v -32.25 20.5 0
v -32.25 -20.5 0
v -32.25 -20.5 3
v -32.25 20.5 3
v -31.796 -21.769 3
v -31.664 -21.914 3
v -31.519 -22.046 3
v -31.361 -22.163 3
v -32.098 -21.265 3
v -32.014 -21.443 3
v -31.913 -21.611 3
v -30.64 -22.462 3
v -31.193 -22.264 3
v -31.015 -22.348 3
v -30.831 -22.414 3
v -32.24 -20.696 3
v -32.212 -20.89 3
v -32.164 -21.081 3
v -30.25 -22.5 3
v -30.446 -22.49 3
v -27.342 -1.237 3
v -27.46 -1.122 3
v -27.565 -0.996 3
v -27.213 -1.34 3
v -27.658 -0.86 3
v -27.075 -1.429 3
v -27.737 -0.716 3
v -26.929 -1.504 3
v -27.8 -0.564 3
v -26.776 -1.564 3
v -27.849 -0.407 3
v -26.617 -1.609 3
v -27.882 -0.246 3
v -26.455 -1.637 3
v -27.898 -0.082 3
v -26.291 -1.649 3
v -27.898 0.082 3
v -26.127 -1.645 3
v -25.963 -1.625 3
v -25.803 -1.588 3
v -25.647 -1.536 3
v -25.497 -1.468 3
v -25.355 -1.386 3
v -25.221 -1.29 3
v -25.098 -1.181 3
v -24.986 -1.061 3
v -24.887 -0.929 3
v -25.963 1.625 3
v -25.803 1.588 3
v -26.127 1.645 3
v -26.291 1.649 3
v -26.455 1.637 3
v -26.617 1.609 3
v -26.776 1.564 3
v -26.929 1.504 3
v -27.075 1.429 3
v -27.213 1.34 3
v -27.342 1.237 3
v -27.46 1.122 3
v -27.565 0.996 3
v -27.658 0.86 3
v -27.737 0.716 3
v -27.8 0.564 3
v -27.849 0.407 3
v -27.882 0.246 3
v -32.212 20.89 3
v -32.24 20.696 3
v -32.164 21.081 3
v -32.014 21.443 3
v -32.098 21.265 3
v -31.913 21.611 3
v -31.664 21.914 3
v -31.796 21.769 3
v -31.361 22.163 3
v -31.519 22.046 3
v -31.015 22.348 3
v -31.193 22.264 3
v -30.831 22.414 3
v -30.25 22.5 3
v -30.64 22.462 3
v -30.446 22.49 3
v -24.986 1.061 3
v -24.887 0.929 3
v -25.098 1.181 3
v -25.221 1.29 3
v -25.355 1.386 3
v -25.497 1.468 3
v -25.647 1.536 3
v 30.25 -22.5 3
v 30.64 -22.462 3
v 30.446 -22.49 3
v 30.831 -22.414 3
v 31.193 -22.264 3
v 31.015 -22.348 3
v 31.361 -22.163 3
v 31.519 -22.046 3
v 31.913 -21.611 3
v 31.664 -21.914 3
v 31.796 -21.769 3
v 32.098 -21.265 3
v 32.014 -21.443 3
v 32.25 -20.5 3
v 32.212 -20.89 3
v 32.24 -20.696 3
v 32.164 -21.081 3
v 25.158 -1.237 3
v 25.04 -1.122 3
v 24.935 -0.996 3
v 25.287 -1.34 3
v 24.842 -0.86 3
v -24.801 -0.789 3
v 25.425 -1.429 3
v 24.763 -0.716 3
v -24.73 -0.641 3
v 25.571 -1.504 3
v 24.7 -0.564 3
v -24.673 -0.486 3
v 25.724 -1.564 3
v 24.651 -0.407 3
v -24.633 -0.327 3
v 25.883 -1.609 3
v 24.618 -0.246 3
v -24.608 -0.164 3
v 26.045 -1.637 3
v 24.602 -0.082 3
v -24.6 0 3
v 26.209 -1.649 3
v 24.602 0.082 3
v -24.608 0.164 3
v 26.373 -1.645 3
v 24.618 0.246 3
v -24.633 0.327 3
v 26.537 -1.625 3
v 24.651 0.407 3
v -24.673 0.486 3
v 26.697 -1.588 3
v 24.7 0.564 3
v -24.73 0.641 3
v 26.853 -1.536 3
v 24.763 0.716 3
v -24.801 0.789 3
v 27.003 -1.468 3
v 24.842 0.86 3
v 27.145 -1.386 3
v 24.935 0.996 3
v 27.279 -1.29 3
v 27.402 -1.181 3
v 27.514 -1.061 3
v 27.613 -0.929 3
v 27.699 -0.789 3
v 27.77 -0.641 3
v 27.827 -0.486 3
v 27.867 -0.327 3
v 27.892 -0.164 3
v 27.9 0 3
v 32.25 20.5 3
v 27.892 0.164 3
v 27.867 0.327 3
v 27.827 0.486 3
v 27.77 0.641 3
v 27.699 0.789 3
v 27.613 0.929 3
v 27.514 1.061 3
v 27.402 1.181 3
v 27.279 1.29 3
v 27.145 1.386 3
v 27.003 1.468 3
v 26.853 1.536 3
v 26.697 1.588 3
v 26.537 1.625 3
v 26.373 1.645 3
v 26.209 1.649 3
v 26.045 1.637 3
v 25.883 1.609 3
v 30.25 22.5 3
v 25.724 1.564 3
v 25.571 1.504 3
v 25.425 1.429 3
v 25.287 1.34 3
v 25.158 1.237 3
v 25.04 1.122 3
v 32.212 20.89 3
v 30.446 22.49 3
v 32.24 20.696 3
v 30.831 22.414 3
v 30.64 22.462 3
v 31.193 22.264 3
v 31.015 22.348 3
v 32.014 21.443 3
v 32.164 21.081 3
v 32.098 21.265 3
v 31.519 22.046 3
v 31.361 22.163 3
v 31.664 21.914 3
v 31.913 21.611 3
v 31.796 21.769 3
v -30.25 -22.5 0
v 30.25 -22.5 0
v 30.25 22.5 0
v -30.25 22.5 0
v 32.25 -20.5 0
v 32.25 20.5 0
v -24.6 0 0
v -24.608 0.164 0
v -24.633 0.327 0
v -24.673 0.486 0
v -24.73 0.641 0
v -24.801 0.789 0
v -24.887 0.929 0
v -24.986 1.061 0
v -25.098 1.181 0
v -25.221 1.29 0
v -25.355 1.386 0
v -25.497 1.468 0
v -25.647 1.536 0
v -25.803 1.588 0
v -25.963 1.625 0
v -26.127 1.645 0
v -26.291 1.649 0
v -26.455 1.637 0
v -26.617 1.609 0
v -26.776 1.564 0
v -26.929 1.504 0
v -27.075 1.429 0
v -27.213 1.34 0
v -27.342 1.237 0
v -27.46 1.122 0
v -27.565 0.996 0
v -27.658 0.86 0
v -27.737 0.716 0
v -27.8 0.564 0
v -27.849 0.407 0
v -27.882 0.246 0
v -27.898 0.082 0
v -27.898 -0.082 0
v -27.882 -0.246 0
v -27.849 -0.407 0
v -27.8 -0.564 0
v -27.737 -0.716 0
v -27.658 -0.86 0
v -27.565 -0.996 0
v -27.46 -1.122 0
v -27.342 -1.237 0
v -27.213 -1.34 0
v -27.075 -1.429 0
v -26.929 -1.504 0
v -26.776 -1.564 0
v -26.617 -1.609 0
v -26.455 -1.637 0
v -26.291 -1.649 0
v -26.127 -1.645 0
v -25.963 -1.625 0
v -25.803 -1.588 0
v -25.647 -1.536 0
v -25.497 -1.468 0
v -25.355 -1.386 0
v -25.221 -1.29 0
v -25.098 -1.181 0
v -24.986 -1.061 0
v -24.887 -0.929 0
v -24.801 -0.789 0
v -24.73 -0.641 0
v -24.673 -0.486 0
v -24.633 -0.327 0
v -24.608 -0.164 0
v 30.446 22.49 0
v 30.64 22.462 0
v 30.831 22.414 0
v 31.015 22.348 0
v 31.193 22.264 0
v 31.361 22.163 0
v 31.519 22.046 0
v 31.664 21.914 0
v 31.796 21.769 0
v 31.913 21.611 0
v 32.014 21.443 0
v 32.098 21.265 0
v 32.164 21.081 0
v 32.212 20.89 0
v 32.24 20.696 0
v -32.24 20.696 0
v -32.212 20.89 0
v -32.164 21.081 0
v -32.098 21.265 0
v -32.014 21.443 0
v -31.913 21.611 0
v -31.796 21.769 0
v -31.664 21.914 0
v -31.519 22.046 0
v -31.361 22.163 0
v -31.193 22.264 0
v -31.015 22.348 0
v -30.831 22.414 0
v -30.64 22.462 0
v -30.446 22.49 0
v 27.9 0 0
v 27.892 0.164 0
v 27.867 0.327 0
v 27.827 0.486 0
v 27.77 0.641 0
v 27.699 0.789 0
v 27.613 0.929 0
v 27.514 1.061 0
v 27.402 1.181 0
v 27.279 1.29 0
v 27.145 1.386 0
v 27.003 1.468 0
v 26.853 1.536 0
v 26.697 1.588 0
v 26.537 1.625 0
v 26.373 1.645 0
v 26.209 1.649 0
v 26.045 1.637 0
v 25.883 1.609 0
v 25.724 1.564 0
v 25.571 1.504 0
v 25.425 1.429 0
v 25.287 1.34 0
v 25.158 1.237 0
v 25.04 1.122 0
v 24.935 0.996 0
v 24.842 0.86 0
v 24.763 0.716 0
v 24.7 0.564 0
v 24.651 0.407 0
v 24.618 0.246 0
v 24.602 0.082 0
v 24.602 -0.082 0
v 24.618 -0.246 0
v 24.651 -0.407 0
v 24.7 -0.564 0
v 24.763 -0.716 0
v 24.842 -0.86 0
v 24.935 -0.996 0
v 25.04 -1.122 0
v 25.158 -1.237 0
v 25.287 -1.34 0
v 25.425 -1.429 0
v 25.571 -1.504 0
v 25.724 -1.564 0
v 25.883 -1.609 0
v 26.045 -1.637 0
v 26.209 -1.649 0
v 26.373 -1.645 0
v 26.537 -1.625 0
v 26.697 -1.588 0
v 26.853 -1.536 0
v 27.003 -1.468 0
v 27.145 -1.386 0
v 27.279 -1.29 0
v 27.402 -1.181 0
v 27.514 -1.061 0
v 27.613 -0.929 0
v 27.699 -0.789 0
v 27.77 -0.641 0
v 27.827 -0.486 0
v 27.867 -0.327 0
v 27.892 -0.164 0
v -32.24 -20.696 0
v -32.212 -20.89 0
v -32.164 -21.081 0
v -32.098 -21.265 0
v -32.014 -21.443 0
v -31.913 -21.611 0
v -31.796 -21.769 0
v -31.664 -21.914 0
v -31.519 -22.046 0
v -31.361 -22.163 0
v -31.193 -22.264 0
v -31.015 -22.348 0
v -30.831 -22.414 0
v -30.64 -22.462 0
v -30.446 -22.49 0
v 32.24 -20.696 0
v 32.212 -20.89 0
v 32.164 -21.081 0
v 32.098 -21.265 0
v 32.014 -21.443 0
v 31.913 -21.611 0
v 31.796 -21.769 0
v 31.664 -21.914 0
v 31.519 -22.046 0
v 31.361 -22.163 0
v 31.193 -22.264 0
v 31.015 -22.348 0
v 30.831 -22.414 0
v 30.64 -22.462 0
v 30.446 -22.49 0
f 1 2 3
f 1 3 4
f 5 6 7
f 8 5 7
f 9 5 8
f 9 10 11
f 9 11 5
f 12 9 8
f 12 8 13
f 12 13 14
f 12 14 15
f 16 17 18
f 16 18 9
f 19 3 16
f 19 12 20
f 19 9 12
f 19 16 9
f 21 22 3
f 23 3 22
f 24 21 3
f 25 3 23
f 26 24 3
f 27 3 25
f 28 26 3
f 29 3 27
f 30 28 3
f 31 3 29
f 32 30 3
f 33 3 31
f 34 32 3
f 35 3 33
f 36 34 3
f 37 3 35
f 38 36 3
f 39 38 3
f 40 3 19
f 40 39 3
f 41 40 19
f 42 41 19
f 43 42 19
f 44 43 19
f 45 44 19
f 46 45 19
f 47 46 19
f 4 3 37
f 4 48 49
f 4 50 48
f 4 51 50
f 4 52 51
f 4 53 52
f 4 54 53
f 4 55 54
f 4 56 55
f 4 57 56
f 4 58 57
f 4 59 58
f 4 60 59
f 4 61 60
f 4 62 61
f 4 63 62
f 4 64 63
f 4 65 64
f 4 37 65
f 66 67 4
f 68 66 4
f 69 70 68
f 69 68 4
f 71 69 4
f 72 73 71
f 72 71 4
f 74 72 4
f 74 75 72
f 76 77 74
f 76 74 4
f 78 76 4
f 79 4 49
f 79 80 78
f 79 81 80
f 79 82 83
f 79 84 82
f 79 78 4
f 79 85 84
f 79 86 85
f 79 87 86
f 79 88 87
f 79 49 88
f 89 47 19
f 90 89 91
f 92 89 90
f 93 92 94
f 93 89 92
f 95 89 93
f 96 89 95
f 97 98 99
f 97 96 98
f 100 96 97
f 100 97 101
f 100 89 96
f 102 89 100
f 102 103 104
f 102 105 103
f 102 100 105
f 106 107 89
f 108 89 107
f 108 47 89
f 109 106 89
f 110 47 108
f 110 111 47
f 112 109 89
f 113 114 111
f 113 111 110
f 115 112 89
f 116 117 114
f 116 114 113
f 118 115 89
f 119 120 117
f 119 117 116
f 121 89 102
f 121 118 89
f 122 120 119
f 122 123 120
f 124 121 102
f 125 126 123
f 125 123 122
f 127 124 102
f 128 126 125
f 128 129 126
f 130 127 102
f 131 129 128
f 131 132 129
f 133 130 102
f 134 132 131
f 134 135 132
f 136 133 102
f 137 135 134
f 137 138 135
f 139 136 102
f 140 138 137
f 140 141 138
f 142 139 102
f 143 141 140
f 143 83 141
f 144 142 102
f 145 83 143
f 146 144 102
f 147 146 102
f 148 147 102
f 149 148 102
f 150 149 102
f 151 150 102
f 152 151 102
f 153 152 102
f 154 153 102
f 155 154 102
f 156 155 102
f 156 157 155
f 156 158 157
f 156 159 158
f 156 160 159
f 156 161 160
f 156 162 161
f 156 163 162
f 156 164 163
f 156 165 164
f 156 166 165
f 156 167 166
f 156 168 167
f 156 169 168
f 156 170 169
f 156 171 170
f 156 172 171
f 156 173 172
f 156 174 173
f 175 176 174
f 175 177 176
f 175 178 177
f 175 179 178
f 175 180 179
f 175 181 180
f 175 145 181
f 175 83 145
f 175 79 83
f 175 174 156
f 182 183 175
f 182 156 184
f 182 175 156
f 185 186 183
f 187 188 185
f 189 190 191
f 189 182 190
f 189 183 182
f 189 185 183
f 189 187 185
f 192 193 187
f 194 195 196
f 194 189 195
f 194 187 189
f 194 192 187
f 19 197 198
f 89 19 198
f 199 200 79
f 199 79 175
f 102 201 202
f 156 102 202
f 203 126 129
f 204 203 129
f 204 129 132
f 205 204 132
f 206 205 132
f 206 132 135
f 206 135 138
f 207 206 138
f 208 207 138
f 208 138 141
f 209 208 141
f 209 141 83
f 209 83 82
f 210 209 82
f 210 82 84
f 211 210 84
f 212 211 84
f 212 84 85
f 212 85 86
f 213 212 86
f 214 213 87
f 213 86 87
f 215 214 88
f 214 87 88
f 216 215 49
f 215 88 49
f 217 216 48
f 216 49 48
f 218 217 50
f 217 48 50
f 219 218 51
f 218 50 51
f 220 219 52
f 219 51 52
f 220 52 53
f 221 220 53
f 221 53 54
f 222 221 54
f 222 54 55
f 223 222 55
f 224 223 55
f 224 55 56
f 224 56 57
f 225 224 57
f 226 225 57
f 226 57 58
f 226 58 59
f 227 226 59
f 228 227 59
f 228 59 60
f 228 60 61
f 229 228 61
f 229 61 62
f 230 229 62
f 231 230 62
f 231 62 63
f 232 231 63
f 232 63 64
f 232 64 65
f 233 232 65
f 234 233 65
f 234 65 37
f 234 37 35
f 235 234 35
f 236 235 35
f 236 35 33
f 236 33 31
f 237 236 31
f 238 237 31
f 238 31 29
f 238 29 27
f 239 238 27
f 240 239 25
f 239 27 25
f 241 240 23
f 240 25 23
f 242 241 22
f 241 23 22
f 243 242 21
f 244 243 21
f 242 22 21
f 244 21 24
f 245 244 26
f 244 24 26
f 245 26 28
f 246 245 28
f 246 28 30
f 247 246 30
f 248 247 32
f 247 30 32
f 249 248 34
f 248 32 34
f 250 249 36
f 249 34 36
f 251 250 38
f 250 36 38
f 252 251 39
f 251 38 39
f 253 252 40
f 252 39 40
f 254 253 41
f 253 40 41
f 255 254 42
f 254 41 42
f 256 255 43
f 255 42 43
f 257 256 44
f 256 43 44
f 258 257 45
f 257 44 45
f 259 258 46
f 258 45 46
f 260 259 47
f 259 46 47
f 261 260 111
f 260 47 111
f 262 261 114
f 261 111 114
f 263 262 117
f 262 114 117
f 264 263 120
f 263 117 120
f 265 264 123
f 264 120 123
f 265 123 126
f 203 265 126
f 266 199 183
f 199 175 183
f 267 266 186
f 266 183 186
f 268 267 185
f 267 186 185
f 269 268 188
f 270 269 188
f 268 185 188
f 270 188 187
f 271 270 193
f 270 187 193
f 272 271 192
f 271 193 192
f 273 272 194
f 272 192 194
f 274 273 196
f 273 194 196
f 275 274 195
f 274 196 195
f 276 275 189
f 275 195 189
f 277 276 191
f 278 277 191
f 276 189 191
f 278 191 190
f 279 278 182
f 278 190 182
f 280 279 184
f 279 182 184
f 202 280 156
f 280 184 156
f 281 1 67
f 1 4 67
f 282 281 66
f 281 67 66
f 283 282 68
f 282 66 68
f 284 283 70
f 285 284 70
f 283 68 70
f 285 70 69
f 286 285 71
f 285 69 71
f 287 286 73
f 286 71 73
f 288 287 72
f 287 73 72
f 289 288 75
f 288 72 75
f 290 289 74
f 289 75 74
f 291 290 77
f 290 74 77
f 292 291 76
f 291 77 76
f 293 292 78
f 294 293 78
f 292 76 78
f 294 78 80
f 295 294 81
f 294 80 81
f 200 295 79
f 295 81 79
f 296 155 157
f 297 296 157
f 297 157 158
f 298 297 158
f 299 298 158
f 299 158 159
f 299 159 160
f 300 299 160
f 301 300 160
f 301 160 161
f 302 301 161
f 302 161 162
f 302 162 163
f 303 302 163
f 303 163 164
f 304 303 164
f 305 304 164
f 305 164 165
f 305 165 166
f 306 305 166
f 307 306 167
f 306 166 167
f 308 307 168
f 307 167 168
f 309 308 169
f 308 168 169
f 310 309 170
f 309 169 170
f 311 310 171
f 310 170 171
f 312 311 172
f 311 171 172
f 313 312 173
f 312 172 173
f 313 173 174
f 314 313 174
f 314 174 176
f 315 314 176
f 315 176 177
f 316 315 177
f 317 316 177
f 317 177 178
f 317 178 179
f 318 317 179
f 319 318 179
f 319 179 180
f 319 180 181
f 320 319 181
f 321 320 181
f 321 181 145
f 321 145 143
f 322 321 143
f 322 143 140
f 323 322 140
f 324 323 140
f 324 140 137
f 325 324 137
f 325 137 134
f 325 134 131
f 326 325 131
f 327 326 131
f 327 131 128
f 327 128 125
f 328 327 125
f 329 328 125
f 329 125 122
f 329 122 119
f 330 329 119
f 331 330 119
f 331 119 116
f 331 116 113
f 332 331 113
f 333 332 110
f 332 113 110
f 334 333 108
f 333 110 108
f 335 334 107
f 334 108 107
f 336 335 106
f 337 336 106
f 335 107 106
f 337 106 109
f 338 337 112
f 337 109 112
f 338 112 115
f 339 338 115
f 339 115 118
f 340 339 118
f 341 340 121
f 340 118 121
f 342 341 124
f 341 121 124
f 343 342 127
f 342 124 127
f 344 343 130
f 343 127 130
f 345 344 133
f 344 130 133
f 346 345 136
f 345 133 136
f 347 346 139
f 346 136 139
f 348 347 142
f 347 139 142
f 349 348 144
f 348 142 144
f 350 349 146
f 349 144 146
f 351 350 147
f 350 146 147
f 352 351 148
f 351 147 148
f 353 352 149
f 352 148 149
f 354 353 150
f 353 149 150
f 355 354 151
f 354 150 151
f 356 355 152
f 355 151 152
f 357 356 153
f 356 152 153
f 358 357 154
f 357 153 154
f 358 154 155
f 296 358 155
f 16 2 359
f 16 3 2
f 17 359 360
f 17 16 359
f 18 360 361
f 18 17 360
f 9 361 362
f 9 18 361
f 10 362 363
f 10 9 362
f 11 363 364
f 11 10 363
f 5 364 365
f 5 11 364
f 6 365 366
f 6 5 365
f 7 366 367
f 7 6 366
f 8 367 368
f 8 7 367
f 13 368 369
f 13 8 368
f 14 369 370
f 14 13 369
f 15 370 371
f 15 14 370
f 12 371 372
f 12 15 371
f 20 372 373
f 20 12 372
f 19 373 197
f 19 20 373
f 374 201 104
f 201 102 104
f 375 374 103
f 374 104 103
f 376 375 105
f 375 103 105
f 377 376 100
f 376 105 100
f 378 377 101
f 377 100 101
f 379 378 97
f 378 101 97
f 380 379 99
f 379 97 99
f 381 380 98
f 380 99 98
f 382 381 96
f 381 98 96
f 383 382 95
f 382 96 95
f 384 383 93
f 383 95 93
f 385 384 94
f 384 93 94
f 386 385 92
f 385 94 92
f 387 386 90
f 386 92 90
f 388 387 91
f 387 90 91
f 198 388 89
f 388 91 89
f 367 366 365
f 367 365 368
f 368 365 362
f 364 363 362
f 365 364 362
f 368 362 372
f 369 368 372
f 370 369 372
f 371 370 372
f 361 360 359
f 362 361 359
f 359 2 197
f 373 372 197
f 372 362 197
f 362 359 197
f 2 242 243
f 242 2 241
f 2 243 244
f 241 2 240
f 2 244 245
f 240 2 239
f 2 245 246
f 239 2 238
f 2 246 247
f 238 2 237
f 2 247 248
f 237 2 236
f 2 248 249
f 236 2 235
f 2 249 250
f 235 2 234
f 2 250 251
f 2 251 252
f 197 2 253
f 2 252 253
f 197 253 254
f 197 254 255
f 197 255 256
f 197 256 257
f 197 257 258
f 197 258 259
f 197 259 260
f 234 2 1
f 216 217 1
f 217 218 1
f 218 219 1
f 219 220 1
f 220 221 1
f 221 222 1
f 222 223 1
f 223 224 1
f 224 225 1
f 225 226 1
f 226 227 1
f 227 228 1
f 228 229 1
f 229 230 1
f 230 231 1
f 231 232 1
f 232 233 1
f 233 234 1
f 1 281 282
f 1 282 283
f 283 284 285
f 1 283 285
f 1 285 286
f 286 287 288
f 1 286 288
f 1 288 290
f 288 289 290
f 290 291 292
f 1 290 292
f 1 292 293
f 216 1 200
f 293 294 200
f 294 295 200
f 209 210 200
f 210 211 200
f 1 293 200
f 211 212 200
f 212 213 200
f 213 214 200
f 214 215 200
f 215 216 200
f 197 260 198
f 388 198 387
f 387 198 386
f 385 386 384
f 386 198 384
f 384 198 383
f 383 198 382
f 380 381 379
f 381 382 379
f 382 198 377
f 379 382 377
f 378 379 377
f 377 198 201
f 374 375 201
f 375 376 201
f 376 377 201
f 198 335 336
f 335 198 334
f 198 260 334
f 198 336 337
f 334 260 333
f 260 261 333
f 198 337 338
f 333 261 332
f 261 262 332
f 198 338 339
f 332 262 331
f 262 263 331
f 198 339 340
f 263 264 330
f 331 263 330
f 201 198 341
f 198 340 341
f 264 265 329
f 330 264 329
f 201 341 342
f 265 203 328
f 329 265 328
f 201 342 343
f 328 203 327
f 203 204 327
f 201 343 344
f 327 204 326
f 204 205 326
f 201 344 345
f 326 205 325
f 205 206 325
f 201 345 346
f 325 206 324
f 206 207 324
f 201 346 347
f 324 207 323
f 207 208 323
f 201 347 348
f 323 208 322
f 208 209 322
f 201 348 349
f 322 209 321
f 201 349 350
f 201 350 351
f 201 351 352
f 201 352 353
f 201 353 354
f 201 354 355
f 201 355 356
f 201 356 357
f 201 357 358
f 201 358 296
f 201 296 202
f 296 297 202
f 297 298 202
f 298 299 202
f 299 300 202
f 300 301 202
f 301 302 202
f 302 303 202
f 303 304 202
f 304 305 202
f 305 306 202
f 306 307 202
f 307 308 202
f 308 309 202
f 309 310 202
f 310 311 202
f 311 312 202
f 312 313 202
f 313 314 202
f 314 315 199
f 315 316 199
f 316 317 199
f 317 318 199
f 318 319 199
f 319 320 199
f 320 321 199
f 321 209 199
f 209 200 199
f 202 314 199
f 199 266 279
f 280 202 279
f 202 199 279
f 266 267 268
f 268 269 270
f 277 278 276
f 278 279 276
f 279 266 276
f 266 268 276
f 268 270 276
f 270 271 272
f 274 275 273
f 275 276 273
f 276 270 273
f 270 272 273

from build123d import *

# Parameters (mm, degrees)
SKETCH_1_W          = 64.5
SKETCH_1_H          = 45
EXTRUDE_1_DEPTH     = 3
SKETCH_6_W          = 12
SKETCH_6_H          = 10
EXTRUDE_4_DEPTH     = 3
FILLET_1_R          = 2
SKETCH_7_R          = 1.65
CUT_EXTRUDE_3_DEPTH = 6
SKETCH_9_W          = 6
SKETCH_9_H          = 14
CUT_EXTRUDE_4_DEPTH = 10
SKETCH_8_R          = 1.65
CUT_EXTRUDE_5_DEPTH = 10


with BuildPart() as part:
    # 草图1 → 凸台-拉伸1 (new body)
    with BuildSketch(Plane.XY):
        Rectangle(SKETCH_1_W, SKETCH_1_H)
    extrude(amount=EXTRUDE_1_DEPTH)

    # 草图6 → 凸台-拉伸4 (add)
    with BuildSketch(Plane.XY.offset(3)):
        with Locations((32.25, 0)):
            Rectangle(SKETCH_6_W, SKETCH_6_H)
        with Locations((-32.25, 0)):
            Rectangle(SKETCH_6_W, SKETCH_6_H)
    extrude(amount=-EXTRUDE_4_DEPTH)

    # 圆角1
    fillet_1_edges = [part.edges().sort_by_distance(p)[0] for p in [
        (38.25, -5, 1.5),
        (32.25, 5, 1.5),
        (32.25, -5, 1.5),
        (38.25, 5, 1.5),
        (-38.25, 5, 1.5),
        (-32.25, 5, 1.5),
        (-38.25, -5, 1.5),
        (-32.25, -5, 1.5),
        (32.25, -22.5, 1.5),
        (-32.25, -22.5, 1.5),
        (-32.25, 22.5, 1.5),
        (32.25, 22.5, 1.5),
    ]]
    fillet(fillet_1_edges, radius=FILLET_1_R)

    # 草图7 → 切除-拉伸3 (cut)
    with BuildSketch(Plane.XY.offset(3)):
        with Locations((-35.25, 0)):
            Circle(SKETCH_7_R)
        with Locations((35.25, 0)):
            Circle(SKETCH_7_R)
    extrude(amount=-CUT_EXTRUDE_3_DEPTH, mode=Mode.SUBTRACT)

    # 草图9 → 切除-拉伸4 (cut)
    with BuildSketch(Plane.XY.offset(3)):
        with Locations((-35.25, 0)):
            Rectangle(SKETCH_9_W, SKETCH_9_H)
        with Locations((35.25, 0)):
            Rectangle(SKETCH_9_W, SKETCH_9_H)
    extrude(amount=-CUT_EXTRUDE_4_DEPTH, mode=Mode.SUBTRACT)

    # 草图8 → 切除-拉伸5 (cut)
    with BuildSketch(Plane.XY.offset(3)):
        with Locations((-26.25, 0)):
            Circle(SKETCH_8_R)
        with Locations((26.25, 0)):
            Circle(SKETCH_8_R)
    extrude(amount=-CUT_EXTRUDE_5_DEPTH, mode=Mode.SUBTRACT)


solid = part.part
